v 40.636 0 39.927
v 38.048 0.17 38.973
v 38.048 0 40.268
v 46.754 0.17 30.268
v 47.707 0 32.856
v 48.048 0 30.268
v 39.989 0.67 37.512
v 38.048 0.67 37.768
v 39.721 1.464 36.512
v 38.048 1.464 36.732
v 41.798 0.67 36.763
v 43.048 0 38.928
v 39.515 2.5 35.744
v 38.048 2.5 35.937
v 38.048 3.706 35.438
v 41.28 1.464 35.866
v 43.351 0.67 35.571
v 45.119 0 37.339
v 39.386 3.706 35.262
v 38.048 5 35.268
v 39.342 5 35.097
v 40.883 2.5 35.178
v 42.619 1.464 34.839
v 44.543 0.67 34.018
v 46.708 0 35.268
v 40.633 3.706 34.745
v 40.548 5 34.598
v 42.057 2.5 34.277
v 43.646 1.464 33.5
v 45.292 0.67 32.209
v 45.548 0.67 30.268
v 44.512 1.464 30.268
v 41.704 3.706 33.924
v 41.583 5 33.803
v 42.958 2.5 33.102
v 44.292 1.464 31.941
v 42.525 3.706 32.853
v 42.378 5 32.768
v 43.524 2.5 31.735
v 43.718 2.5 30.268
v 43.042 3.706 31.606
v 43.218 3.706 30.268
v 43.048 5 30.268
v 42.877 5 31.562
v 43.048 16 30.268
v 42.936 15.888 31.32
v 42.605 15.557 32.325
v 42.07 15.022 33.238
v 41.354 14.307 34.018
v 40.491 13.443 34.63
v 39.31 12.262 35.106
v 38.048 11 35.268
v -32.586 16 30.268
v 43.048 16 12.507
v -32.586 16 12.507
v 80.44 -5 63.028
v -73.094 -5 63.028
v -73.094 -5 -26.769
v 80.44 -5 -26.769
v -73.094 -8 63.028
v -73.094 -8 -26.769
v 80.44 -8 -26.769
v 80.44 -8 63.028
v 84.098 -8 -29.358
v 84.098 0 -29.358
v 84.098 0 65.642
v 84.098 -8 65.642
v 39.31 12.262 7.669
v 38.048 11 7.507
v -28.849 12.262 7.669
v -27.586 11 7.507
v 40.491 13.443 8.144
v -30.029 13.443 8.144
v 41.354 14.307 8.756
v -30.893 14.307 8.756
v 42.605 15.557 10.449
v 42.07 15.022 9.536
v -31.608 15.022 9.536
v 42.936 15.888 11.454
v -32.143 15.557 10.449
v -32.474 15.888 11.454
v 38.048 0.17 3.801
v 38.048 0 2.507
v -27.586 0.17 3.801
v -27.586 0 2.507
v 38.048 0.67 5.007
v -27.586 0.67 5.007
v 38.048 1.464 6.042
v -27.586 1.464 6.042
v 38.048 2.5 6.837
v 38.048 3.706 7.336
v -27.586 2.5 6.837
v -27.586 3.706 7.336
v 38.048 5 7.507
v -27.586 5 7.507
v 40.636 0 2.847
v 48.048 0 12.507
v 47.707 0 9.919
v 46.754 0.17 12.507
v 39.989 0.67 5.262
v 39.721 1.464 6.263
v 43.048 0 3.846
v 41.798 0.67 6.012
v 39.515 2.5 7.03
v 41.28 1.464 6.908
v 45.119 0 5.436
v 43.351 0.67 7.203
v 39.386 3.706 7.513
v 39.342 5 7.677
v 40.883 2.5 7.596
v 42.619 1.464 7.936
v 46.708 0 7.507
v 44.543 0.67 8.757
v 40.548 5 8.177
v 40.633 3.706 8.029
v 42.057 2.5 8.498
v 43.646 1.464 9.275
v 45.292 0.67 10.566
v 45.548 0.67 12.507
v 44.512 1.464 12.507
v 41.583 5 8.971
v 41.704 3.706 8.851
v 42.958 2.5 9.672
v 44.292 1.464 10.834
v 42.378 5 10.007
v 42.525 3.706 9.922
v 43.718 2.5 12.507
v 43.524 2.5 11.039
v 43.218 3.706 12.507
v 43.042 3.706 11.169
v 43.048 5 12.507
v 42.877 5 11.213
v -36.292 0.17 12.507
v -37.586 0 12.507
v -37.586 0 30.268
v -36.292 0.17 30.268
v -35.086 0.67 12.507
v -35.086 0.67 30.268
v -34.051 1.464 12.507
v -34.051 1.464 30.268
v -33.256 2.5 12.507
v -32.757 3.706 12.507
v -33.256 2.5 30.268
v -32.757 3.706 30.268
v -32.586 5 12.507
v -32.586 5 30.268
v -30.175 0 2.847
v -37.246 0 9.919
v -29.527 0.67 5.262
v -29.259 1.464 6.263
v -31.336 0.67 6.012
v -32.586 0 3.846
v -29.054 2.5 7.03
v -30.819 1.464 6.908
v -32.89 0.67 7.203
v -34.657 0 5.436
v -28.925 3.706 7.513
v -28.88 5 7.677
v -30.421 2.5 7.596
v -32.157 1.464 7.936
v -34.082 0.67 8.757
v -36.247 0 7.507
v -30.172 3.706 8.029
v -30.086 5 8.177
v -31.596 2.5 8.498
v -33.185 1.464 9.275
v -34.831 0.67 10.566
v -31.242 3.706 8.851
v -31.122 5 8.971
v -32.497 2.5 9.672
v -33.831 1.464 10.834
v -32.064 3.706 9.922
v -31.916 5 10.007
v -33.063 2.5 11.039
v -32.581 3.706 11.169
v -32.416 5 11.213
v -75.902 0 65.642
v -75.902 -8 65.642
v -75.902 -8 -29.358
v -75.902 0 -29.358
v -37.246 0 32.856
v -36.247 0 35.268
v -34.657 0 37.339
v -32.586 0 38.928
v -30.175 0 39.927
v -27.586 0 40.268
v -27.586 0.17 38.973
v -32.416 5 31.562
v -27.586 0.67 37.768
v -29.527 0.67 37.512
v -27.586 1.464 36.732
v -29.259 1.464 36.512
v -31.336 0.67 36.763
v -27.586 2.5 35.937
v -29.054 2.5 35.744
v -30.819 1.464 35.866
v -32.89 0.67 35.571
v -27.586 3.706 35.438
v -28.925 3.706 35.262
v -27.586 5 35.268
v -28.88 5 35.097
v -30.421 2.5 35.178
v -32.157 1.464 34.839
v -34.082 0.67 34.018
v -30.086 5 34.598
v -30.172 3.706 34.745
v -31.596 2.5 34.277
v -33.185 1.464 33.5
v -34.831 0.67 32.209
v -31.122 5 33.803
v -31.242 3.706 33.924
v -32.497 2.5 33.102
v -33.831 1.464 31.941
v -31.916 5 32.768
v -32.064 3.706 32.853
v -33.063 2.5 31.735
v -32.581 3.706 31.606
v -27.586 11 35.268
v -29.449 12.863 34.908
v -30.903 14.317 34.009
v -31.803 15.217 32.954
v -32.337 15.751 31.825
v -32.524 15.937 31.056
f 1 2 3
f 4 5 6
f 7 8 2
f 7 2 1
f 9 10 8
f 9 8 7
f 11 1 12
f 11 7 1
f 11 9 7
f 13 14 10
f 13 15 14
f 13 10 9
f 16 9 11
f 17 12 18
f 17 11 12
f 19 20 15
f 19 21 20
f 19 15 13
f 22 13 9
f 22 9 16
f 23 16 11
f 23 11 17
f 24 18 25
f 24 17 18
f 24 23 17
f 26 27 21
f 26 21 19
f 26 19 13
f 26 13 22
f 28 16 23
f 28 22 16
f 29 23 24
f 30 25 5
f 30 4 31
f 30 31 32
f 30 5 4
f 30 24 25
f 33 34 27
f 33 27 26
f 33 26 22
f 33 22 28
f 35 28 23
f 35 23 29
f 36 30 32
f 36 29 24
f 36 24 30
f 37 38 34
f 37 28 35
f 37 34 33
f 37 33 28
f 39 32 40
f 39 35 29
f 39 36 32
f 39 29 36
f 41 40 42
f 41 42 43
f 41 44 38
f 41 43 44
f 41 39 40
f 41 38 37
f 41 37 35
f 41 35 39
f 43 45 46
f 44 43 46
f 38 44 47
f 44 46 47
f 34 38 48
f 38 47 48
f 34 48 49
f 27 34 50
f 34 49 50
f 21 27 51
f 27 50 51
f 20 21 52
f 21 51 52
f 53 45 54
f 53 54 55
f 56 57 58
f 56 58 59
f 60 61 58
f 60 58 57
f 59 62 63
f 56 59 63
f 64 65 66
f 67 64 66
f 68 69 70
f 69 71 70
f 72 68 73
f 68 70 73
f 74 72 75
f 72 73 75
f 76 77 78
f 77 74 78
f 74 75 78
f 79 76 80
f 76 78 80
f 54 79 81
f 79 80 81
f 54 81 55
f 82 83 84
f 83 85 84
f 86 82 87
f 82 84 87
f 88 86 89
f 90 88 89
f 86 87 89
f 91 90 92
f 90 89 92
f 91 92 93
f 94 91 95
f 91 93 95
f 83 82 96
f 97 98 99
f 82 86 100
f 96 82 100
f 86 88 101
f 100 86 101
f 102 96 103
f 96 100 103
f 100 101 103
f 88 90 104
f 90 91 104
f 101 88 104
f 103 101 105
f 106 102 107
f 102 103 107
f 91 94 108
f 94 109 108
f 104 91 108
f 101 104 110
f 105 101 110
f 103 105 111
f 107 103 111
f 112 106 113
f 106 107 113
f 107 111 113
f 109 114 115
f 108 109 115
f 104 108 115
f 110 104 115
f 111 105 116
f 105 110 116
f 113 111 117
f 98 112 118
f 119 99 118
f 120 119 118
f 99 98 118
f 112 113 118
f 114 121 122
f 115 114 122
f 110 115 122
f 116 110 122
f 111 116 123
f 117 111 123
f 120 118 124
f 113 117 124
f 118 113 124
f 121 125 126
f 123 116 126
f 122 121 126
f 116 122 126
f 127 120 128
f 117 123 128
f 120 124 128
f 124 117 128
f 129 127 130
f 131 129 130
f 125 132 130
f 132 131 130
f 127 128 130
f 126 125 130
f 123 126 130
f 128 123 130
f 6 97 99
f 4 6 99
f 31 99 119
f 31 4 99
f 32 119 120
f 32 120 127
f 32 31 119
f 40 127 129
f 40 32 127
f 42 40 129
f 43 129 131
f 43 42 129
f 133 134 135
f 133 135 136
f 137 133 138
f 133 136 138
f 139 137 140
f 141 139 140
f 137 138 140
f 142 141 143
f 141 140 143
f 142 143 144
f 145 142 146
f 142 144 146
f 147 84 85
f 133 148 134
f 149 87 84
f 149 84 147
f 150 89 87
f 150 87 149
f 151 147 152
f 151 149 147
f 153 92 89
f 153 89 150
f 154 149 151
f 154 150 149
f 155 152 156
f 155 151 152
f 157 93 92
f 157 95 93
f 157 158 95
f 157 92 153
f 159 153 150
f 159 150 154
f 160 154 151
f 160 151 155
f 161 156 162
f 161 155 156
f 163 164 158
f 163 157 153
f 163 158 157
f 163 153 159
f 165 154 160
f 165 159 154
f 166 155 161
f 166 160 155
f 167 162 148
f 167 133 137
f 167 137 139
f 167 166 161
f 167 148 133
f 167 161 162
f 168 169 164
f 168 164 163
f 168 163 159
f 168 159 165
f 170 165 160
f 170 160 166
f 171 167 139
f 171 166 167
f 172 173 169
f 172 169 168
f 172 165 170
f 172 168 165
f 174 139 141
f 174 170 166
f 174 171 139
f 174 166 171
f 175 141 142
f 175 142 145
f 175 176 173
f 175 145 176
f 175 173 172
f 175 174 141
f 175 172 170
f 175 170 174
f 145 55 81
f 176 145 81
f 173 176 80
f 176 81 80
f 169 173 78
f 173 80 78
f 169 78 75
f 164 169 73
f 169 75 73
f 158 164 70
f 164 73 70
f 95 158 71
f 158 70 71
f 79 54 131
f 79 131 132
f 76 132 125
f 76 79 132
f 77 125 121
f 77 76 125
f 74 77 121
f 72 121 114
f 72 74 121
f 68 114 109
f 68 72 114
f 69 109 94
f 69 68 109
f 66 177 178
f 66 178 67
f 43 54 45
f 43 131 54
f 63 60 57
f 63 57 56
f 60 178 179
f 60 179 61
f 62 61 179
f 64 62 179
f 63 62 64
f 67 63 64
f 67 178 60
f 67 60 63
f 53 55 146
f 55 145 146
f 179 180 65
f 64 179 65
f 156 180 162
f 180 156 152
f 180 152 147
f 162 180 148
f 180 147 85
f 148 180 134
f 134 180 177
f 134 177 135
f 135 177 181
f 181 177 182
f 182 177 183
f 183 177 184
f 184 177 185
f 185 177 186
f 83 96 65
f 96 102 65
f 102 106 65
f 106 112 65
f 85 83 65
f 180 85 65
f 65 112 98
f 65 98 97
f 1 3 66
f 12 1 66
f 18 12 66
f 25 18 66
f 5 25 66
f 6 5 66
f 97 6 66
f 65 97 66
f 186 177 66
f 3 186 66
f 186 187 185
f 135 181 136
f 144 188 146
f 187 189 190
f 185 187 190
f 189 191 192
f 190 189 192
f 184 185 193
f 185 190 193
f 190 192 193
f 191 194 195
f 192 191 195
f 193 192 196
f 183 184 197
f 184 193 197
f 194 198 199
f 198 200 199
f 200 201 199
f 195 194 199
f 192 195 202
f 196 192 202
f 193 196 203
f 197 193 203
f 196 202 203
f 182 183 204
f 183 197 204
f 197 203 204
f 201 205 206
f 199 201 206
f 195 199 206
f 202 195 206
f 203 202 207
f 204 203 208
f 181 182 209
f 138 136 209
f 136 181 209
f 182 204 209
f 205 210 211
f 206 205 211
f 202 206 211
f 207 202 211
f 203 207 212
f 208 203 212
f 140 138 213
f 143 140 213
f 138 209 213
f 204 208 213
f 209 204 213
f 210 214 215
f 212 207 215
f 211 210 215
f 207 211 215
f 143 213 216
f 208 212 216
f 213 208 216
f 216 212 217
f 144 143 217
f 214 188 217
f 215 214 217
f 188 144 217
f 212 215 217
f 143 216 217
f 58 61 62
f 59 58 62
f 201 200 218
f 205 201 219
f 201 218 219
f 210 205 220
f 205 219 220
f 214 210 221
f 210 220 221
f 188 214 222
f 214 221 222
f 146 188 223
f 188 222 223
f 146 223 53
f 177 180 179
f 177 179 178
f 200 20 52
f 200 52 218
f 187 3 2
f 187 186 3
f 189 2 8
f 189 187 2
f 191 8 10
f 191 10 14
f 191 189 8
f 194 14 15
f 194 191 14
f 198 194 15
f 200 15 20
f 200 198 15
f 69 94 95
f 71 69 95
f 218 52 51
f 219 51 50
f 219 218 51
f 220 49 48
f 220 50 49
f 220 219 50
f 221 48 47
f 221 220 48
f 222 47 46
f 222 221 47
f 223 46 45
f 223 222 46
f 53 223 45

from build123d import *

# Parameters (mm, degrees)
F0_W     = 160
F0_H     = 95
F1_DEPTH = 8
F2_W     = 153.534181416
F2_H     = 89.7976644337
F3_DEPTH = 3
F4_W     = 75.6339989603
F4_H     = 27.7607943863
F5_DEPTH = 16
F6_R     = 5


with BuildPart() as f1:
    # F0 (on Front) → F1 (new body)
    with BuildSketch(Plane.XZ):
        with Locations((4.0975642204, 18.1421419978)):
            Rectangle(F0_W, F0_H)
    extrude(amount=F1_DEPTH)

    # F2 (on face) → F3 (cut)
    with BuildSketch(Plane.XZ.offset(8)):
        with Locations((3.6726556718, 18.1294959038)):
            Rectangle(F2_W, F2_H)
    extrude(amount=-F3_DEPTH, mode=Mode.SUBTRACT)

    # F4 (on face) → F5 (join)
    with BuildSketch(Plane(origin=(0, 0, 0), x_dir=(-1, 0, 0), z_dir=(0, 1, 0))):
        with Locations((-5.2306558937, 21.3871421292)):
            Rectangle(F4_W, F4_H)
    extrude(amount=F5_DEPTH)

    # F6
    f6_edges = [f1.edges().sort_by_distance(p)[0] for p in [
        (-32.586344, 8, 35.267539),
        (43.047655, 8, 35.267539),
        (5.230656, 0, 35.267539),
        (5.230656, 16, 35.267539),
        (43.047655, 8, 7.506745),
        (-32.586344, 8, 7.506745),
        (5.230656, 0, 7.506745),
        (5.230656, 16, 7.506745),
        (-32.586344, 0, 21.387142),
        (43.047655, 0, 21.387142),
    ]]
    fillet(f6_edges, radius=F6_R)


solid = f1.part
